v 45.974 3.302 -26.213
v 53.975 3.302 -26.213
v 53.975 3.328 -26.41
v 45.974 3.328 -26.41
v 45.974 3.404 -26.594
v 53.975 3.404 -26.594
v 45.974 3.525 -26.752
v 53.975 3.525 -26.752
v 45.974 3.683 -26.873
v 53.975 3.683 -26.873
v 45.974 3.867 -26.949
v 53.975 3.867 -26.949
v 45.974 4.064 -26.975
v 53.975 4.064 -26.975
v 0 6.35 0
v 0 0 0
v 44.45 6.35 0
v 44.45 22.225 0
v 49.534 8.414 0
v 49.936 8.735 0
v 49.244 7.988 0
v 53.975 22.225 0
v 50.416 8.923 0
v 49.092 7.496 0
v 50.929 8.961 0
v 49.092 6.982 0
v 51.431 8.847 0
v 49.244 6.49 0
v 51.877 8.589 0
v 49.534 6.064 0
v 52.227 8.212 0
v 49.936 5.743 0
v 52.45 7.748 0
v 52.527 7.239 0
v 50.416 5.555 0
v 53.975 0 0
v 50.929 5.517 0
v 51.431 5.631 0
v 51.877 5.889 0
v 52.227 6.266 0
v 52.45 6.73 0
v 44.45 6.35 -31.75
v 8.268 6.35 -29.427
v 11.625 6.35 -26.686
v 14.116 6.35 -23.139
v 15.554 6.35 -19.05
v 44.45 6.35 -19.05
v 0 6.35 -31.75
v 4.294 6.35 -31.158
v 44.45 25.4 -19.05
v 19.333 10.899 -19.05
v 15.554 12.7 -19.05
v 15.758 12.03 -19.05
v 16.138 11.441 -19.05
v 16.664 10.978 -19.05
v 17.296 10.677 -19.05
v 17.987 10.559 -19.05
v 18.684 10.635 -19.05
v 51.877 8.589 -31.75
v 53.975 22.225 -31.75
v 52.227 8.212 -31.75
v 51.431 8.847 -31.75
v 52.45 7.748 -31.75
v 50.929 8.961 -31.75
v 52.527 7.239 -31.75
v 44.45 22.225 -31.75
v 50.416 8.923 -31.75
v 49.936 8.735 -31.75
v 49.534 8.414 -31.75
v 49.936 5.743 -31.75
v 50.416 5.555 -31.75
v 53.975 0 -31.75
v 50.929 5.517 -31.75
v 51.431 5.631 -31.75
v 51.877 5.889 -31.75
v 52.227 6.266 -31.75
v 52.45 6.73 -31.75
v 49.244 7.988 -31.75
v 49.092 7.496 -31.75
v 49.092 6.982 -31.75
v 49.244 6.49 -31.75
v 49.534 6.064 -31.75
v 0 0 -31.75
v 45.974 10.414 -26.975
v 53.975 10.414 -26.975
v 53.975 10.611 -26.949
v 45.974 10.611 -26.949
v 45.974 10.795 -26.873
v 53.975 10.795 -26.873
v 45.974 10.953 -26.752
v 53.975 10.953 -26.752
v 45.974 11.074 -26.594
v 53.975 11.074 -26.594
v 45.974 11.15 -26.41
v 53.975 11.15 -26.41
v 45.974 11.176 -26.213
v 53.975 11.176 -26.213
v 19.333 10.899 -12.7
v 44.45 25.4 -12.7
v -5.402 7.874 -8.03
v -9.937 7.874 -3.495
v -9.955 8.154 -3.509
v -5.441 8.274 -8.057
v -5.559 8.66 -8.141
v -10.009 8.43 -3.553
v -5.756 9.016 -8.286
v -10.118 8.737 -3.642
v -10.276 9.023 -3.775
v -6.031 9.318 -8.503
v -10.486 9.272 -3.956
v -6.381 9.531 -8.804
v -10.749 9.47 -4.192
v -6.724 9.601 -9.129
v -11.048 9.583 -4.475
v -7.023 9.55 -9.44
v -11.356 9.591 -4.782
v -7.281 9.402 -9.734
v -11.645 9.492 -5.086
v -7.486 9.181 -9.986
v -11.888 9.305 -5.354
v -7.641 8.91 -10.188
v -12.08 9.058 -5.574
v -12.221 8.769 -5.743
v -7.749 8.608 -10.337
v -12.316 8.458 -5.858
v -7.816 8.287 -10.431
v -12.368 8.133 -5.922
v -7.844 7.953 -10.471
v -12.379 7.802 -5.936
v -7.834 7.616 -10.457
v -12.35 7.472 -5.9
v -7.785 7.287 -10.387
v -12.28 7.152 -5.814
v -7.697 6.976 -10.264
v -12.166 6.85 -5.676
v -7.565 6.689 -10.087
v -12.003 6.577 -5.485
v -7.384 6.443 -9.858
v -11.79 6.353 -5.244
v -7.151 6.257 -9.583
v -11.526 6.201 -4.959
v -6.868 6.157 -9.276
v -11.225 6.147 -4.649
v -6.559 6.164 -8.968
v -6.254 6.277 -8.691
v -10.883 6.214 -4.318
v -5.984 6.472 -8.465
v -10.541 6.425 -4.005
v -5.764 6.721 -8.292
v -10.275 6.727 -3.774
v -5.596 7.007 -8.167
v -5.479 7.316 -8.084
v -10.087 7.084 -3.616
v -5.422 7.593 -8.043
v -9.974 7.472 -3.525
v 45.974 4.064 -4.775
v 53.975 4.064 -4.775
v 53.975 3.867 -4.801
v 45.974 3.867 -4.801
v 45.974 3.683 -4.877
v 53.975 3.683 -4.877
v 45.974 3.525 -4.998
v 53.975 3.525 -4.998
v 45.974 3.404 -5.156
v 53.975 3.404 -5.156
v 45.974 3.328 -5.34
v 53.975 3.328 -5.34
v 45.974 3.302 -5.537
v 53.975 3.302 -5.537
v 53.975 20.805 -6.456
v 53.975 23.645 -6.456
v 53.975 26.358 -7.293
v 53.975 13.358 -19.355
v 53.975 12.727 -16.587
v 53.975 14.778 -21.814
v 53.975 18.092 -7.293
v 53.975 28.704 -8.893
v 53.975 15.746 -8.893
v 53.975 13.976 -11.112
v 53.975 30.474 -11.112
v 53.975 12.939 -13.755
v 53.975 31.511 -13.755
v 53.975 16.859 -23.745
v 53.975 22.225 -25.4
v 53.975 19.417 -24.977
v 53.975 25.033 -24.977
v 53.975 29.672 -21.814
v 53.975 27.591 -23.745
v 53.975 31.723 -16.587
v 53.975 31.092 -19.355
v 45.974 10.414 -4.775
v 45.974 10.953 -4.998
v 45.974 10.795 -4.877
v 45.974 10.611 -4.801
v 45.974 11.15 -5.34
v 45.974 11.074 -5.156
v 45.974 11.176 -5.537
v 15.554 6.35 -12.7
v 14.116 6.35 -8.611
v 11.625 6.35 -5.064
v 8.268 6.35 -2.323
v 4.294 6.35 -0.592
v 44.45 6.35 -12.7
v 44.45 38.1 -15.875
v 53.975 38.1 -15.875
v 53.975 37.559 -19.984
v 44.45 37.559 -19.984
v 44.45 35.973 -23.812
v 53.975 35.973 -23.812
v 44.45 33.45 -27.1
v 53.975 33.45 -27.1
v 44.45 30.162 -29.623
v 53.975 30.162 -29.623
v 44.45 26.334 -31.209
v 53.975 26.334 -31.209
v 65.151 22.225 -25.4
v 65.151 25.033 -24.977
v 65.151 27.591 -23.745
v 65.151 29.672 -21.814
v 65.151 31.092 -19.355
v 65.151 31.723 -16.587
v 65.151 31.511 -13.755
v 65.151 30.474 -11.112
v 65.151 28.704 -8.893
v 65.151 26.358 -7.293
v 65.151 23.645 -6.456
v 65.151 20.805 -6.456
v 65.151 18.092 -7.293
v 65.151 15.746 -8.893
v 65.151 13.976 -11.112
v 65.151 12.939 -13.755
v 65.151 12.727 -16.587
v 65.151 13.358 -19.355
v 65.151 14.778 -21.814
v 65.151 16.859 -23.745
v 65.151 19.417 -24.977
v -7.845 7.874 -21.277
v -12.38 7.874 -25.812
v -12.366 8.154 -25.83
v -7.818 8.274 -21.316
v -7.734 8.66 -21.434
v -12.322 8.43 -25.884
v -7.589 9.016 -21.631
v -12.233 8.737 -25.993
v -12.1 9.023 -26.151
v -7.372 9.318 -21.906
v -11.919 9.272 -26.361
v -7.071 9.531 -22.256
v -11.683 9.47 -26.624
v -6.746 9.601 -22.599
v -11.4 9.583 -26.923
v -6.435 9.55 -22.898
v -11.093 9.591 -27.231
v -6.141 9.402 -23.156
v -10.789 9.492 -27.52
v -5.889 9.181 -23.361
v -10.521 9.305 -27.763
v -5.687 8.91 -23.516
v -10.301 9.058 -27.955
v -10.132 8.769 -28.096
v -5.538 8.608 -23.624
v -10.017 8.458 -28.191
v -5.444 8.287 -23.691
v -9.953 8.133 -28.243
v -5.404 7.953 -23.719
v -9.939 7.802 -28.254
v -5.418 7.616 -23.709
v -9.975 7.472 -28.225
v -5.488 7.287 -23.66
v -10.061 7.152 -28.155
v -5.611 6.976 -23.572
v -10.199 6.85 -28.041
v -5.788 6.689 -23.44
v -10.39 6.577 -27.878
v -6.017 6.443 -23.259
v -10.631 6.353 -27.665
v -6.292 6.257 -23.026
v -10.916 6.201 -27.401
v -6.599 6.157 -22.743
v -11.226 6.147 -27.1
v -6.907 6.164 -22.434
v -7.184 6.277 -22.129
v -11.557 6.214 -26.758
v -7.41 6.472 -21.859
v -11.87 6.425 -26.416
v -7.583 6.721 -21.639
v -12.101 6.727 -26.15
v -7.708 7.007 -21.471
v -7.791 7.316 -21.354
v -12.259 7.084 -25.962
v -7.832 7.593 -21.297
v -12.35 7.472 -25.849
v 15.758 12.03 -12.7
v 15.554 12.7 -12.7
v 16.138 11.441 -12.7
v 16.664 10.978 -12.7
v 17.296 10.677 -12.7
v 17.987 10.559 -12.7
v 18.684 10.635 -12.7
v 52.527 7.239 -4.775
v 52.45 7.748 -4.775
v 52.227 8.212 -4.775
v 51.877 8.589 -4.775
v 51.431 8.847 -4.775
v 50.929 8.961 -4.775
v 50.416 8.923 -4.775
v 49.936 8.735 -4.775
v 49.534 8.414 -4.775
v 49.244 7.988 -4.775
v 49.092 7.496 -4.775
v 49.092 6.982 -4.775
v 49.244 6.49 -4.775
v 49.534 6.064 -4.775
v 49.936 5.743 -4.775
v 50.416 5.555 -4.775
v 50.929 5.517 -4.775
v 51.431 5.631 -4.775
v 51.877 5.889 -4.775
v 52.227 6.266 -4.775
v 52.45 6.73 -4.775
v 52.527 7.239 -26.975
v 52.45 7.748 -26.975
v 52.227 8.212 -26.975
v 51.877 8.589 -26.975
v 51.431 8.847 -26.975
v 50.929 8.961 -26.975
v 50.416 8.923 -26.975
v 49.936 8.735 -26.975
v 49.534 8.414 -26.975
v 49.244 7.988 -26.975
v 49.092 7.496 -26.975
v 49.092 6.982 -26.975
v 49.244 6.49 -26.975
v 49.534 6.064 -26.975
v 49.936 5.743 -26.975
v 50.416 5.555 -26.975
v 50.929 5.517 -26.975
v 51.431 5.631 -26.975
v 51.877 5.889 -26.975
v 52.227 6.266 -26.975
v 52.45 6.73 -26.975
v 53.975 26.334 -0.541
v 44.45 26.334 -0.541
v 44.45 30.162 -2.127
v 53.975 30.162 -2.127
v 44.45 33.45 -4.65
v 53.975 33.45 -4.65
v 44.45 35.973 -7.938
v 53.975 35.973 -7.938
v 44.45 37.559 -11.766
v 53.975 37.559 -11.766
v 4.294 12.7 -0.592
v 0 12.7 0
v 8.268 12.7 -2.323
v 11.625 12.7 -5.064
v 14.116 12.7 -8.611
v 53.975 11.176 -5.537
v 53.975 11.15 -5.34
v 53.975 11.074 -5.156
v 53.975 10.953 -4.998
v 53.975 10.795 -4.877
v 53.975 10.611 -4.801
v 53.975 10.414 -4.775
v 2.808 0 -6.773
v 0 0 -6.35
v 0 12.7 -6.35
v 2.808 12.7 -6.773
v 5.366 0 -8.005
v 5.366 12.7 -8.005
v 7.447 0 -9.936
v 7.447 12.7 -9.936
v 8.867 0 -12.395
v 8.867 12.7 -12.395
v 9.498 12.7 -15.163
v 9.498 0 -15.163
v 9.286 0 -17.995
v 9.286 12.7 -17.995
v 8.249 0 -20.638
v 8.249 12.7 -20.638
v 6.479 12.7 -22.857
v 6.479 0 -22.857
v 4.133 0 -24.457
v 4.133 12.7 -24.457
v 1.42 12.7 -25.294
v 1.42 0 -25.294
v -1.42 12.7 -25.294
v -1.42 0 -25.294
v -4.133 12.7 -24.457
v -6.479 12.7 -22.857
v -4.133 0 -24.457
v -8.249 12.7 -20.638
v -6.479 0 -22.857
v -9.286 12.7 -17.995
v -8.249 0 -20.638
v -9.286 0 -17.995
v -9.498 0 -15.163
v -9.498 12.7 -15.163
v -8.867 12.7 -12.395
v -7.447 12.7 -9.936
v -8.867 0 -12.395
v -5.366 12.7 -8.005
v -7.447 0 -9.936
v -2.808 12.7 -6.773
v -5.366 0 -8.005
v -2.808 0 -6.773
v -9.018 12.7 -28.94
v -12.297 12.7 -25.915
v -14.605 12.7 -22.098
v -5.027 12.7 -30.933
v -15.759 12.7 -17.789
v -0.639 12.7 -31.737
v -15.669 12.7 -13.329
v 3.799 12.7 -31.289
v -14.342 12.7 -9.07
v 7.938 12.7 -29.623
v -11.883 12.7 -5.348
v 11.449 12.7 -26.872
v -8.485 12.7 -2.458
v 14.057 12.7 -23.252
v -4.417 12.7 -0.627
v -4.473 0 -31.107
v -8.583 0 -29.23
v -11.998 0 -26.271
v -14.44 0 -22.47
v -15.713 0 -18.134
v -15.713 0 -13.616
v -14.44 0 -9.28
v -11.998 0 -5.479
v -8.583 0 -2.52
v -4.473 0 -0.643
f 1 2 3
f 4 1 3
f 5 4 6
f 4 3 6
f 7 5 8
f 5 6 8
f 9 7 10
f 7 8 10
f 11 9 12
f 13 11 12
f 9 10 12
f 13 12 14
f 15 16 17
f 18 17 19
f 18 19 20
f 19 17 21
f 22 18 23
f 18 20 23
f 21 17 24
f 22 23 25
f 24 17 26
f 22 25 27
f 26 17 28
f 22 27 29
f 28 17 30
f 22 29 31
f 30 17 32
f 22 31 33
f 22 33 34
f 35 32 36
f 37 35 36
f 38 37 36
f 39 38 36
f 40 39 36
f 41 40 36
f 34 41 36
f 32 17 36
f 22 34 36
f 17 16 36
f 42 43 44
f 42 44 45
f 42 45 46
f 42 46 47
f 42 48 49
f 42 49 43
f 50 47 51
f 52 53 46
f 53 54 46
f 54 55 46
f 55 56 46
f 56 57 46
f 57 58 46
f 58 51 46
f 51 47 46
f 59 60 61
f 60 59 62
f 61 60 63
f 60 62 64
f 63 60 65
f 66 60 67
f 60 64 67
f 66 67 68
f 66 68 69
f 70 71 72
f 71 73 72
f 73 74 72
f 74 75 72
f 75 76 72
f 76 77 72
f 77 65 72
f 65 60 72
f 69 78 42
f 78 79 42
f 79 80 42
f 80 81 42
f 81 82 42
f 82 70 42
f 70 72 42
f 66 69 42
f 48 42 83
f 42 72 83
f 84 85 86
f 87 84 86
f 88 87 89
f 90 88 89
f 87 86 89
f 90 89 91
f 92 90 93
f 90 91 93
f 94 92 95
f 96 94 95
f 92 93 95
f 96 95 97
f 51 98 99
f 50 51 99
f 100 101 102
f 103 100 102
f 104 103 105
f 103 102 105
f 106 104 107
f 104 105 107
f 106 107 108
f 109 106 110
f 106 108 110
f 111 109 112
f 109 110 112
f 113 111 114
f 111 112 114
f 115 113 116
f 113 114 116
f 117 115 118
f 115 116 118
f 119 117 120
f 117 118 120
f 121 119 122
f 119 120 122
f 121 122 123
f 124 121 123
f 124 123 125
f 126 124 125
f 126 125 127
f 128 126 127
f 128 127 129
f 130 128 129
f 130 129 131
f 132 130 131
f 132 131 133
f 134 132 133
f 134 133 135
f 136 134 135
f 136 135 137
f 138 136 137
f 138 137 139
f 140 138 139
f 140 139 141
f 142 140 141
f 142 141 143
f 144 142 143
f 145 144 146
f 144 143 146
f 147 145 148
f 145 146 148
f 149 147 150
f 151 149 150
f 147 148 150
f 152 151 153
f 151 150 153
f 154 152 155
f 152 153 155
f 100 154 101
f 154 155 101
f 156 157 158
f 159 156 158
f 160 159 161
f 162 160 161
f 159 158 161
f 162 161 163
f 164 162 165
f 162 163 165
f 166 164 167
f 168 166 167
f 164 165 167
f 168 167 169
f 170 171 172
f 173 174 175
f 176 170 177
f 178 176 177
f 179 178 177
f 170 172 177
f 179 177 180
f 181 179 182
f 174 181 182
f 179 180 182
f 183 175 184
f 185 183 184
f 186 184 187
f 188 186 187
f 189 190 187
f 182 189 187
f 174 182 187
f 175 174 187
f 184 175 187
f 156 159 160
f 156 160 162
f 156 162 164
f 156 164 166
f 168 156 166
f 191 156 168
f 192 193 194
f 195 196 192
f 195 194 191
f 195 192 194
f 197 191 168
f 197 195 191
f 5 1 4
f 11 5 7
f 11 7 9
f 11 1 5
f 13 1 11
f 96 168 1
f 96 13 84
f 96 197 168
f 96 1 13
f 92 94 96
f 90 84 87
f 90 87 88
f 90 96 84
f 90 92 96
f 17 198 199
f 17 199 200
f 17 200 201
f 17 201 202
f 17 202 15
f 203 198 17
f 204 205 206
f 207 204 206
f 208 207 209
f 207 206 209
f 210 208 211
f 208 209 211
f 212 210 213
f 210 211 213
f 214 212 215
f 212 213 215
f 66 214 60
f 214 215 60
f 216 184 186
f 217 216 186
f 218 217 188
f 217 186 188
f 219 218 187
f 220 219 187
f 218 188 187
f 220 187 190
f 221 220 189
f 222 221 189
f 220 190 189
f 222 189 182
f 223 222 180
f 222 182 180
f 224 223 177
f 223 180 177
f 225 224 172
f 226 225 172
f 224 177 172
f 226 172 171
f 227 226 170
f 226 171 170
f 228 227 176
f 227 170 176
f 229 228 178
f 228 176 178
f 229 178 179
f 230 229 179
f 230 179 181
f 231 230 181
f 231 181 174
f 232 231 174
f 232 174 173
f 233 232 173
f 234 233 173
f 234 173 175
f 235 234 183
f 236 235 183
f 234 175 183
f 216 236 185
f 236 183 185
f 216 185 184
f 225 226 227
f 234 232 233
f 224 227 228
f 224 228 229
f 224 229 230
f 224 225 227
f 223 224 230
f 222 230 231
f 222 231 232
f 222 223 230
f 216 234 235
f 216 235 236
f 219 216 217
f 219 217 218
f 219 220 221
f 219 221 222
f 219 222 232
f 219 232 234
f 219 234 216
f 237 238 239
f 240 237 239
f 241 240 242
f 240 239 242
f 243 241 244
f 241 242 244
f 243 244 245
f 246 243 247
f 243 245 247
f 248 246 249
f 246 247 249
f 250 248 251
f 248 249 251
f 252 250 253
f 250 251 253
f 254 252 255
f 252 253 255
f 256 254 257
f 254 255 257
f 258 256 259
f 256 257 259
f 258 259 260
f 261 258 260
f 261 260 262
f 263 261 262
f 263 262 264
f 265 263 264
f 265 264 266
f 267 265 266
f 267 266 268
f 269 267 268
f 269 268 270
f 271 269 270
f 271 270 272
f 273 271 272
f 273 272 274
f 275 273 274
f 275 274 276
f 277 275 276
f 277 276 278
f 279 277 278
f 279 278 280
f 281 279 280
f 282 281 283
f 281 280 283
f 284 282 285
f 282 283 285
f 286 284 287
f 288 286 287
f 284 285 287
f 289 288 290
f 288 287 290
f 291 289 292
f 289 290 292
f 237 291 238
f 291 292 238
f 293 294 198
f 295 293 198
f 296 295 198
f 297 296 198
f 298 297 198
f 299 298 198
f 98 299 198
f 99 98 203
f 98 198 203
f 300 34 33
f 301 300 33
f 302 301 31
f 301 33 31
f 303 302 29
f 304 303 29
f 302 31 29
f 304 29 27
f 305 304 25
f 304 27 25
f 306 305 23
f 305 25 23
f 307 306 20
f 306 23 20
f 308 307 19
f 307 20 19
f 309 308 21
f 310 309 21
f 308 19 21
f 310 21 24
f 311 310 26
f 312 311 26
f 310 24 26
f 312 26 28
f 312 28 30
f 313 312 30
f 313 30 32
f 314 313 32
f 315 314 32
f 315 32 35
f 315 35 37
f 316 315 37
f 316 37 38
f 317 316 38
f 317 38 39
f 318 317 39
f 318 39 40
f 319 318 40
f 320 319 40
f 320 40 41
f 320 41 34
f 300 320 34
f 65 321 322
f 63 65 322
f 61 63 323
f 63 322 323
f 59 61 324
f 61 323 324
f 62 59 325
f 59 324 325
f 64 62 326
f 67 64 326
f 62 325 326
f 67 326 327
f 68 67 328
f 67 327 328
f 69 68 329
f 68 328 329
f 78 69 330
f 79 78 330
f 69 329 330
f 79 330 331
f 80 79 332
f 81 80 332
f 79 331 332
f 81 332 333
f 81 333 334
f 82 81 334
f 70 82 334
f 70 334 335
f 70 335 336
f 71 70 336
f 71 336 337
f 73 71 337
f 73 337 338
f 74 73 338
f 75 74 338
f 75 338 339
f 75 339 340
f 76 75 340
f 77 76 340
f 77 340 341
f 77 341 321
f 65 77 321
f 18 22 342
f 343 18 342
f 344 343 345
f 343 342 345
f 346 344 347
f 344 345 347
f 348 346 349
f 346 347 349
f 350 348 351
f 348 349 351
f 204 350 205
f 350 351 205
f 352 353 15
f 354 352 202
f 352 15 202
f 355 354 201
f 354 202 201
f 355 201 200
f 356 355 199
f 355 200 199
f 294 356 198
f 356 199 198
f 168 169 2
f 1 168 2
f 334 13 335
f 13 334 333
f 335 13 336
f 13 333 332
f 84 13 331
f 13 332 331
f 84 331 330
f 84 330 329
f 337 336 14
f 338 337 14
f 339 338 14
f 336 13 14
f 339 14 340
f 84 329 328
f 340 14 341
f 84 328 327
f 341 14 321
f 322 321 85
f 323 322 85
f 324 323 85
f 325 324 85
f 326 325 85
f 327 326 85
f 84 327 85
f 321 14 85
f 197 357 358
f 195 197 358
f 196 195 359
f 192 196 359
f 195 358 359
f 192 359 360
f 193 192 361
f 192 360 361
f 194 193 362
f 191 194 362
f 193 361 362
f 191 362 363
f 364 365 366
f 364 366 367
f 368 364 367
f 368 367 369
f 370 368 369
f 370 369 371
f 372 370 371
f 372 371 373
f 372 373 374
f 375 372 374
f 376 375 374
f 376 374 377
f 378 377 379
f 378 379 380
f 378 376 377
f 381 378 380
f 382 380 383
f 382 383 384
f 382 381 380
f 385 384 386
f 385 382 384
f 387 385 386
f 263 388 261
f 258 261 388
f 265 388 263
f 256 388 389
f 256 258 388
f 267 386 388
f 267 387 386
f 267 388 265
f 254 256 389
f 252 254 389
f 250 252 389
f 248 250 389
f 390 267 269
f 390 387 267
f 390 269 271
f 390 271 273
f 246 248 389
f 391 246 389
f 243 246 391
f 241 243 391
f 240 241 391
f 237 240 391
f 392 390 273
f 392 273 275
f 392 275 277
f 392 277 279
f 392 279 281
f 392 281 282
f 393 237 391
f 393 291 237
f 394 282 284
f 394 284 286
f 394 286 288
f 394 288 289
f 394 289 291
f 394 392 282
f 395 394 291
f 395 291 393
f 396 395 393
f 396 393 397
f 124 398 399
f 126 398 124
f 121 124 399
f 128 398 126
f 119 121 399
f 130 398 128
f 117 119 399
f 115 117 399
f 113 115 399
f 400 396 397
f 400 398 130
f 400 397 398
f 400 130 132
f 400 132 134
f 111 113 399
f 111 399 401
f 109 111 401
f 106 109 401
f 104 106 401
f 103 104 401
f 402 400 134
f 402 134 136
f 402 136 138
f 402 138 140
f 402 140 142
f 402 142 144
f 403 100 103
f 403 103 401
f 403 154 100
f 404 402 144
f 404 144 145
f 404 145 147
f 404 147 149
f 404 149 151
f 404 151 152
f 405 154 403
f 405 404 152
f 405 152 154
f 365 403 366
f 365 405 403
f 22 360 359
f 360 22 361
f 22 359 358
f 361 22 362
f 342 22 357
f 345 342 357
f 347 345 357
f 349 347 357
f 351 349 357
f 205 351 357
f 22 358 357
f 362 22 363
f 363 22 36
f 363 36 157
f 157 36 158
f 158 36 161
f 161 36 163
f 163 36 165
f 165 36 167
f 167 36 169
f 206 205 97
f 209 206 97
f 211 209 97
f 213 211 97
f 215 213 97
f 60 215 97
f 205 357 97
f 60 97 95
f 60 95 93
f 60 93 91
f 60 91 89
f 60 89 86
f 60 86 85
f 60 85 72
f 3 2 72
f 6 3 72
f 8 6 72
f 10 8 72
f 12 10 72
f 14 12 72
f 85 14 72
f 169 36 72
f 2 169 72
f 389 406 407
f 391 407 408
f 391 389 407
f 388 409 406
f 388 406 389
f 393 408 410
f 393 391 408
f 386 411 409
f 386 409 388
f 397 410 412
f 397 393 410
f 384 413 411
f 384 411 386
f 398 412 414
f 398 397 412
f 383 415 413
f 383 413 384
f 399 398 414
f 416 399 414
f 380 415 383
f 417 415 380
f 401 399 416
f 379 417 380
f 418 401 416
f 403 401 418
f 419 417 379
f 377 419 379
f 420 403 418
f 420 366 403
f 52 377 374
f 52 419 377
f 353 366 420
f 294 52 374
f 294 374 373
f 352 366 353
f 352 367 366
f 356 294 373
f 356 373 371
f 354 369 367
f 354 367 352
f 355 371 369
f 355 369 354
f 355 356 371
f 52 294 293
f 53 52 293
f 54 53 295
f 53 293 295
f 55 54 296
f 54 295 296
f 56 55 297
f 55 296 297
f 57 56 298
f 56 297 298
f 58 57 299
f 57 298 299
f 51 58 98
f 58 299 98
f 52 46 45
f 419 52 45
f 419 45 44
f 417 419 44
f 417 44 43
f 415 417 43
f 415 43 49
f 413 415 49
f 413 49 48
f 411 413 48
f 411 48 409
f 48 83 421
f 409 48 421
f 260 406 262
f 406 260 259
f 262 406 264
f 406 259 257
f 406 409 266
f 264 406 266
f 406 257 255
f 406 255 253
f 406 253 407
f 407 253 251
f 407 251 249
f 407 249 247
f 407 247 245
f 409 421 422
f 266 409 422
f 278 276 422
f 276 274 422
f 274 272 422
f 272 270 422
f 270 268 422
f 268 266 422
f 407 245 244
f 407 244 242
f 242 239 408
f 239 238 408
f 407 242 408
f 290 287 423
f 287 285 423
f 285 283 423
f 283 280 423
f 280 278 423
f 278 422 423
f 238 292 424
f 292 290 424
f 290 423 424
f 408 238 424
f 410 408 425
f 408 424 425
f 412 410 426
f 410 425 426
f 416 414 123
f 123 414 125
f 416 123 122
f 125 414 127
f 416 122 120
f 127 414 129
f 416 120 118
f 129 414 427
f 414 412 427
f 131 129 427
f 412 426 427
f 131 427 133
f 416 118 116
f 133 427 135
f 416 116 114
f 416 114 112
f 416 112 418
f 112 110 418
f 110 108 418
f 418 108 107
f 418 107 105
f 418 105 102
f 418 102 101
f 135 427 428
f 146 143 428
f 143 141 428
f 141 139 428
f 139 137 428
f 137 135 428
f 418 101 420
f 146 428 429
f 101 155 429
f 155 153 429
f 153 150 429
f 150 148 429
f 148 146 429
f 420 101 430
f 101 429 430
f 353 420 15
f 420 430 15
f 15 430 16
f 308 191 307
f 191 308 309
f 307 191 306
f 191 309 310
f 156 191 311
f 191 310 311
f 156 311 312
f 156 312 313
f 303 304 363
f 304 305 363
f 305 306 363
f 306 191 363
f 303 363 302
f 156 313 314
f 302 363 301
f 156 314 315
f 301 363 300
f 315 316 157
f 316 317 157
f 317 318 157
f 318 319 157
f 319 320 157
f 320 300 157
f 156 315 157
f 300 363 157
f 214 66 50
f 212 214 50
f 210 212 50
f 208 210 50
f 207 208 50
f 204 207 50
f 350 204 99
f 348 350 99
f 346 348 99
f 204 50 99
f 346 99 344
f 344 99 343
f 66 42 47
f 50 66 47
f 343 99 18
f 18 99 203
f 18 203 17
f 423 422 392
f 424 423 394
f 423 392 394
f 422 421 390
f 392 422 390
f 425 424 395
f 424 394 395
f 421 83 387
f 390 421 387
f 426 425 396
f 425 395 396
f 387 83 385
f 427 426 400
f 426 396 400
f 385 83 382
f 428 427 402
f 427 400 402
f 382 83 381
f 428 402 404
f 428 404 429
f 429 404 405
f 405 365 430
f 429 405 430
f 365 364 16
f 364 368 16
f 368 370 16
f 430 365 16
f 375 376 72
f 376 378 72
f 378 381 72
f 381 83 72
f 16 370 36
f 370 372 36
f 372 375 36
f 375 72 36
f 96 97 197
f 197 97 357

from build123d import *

# Parameters (mm, degrees)
BOSS_EXTRUDE1_DEPTH = 6.35
SKETCH1_3_R         = 9.525
BOSS_EXTRUDE2_DEPTH = 12.7
BOSS_EXTRUDE3_DEPTH = 31.75
CUT_EXTRUDE1_REACH  = 70.759
SKETCH4_R           = 9.525
BOSS_EXTRUDE4_DEPTH = 11.176
CUT_EXTRUDE5_DEPTH  = 11.176
CUT_EXTRUDE6_DEPTH  = 8.001
SKETCH6_R           = 1.7272
CUT_EXTRUDE7_DEPTH  = 8.001
SKETCH7_R           = 1.7272
CUT_EXTRUDE8_DEPTH  = 8.001
SKETCH8_R           = 1.7272
CUT_EXTRUDE9_DEPTH  = 32.131


with BuildPart() as part:
    # Sketch1 → Boss-Extrude1 (new body)
    with BuildSketch(Plane(origin=(0, 0, 0), x_dir=(1, 0, 0), z_dir=(0, 1, 0))):
        with BuildLine():
            ThreePointArc((15.875, 15.875), (11.225320151, 4.649679849), (0, 0))
            Line((0, 0), (53.975, 0))
            Line((53.975, 0), (53.975, 31.75))
            Line((53.975, 31.75), (0, 31.75))
            ThreePointArc((0, 31.75), (11.225320151, 27.100320151), (15.875, 15.875))
        make_face()
    extrude(amount=BOSS_EXTRUDE1_DEPTH)

    # Sketch1<3> → Boss-Extrude2 (add)
    with BuildSketch(Plane(origin=(0, 0, 0), x_dir=(1, 0, 0), z_dir=(0, 1, 0))):
        with BuildLine():
            ThreePointArc((0, 31.75), (-15.875, 15.875), (0, 0))
            ThreePointArc((0, 0), (11.225320151, 4.649679849), (15.875, 15.875))
            ThreePointArc((15.875, 15.875), (11.225320151, 27.100320151), (0, 31.75))
        make_face()
        with Locations((0, 15.875)):
            Circle(SKETCH1_3_R, mode=Mode.SUBTRACT)
    extrude(amount=BOSS_EXTRUDE2_DEPTH)

    # Sketch2 → Boss-Extrude3 (add)
    with BuildSketch(Plane(origin=(0, 6.35, 0), x_dir=(1, 0, 0), z_dir=(0, 1, 0))):
        with BuildLine():
            Line((44.45, 19.05), (15.554259867, 19.05))
            ThreePointArc((15.554259867, 19.05), (15.875, 15.875), (15.554259867, 12.7))
            Line((15.554259867, 12.7), (44.45, 12.7))
            Line((44.45, 12.7), (44.45, 0))
            Line((44.45, 0), (53.975, 0))
            Line((53.975, 0), (53.975, 31.75))
            Line((53.975, 31.75), (44.45, 31.75))
            Line((44.45, 31.75), (44.45, 19.05))
        make_face()
    extrude(amount=BOSS_EXTRUDE3_DEPTH)

    # Sketch3 → Cut-Extrude1 (cut, up to next)
    with BuildSketch(Plane.XY.offset(-12.7), mode=Mode.PRIVATE) as cut_extrude1_sk1:
        with BuildLine():
            Line((15.554259867, 38.1), (15.554259867, 12.7))
            ThreePointArc((15.554259867, 12.7), (16.969776393, 10.805527444), (19.332836073, 10.898598646))
            Line((19.332836073, 10.898598646), (44.45, 25.4))
            Line((44.45, 25.4), (44.45, 38.1))
            Line((44.45, 38.1), (15.554259867, 38.1))
        make_face()
    cut_extrude1_tool1 = extrude(cut_extrude1_sk1.sketch, amount=-CUT_EXTRUDE1_REACH, mode=Mode.PRIVATE) & part.part
    add(cut_extrude1_tool1.solids().sort_by_distance((28.175403, 27.146938, -12.7))[0], mode=Mode.SUBTRACT)

    # Sketch4<3> → Cut-Extrude5 (cut)
    with BuildSketch(Plane(origin=(53.975, 0, 0), x_dir=(0, 0, -1), z_dir=(1, 0, 0))):
        with BuildLine():
            ThreePointArc((0, 22.225), (15.875, 38.1), (31.75, 22.225))
            Line((31.75, 22.225), (36.075719822, 22.225))
            Line((36.075719822, 22.225), (36.075719822, 42.558697958))
            Line((36.075719822, 42.558697958), (-5.810634452, 42.558697958))
            Line((-5.810634452, 42.558697958), (-5.810634452, 22.225))
            Line((-5.810634452, 22.225), (0, 22.225))
        make_face()
    extrude(amount=-CUT_EXTRUDE5_DEPTH, mode=Mode.SUBTRACT)

    # Sketch4<4> → Cut-Extrude6 (cut)
    with BuildSketch(Plane(origin=(53.975, 0, 0), x_dir=(0, 0, -1), z_dir=(1, 0, 0))):
        with BuildLine():
            ThreePointArc((5.5372, 11.176), (4.998384633, 10.952815367), (4.7752, 10.414))
            Line((4.7752, 10.414), (4.7752, 4.064))
            ThreePointArc((4.7752, 4.064), (4.998384633, 3.525184633), (5.5372, 3.302))
            Line((5.5372, 3.302), (26.2128, 3.302))
            ThreePointArc((26.2128, 3.302), (26.751615367, 3.525184633), (26.9748, 4.064))
            Line((26.9748, 4.064), (26.9748, 10.414))
            ThreePointArc((26.9748, 10.414), (26.751615367, 10.952815367), (26.2128, 11.176))
            Line((26.2128, 11.176), (5.5372, 11.176))
        make_face()
    extrude(amount=-CUT_EXTRUDE6_DEPTH, mode=Mode.SUBTRACT)

    # Sketch6 → Cut-Extrude7 (cut)
    with BuildSketch(Plane(origin=(-19.162820151, 0, -19.162820151), x_dir=(-0.7071067811865487, 0, 0.7071067811865465), z_dir=(-0.7071067811865465, 0, -0.7071067811865487))):
        with Locations((-11.225320151, 7.874)):
            Circle(SKETCH6_R)
    extrude(amount=-CUT_EXTRUDE7_DEPTH, mode=Mode.SUBTRACT)

    # Sketch7 → Cut-Extrude8 (cut)
    with BuildSketch(Plane(origin=(-11.225320151, 12.7, -4.649679849), x_dir=(0.707106781186549, 0, 0.707106781186546), z_dir=(-0.707106781186546, 0, 0.707106781186549))):
        with Locations((0, -4.826)):
            Circle(SKETCH7_R)
    extrude(amount=-CUT_EXTRUDE8_DEPTH, mode=Mode.SUBTRACT)

    # Sketch8 → Cut-Extrude9 (cut)
    with BuildSketch(Plane.XY):
        with Locations((50.8, 7.239)):
            Circle(SKETCH8_R)
    extrude(amount=-CUT_EXTRUDE9_DEPTH, mode=Mode.SUBTRACT)


with BuildPart() as body_2:
    # Sketch4 → Boss-Extrude4 (new body)
    with BuildSketch(Plane(origin=(53.975, 0, 0), x_dir=(0, 0, -1), z_dir=(1, 0, 0))):
        with Locations((15.875, 22.225)):
            Circle(SKETCH4_R)
    extrude(amount=BOSS_EXTRUDE4_DEPTH)


solid = Compound([part.part, body_2.part])
